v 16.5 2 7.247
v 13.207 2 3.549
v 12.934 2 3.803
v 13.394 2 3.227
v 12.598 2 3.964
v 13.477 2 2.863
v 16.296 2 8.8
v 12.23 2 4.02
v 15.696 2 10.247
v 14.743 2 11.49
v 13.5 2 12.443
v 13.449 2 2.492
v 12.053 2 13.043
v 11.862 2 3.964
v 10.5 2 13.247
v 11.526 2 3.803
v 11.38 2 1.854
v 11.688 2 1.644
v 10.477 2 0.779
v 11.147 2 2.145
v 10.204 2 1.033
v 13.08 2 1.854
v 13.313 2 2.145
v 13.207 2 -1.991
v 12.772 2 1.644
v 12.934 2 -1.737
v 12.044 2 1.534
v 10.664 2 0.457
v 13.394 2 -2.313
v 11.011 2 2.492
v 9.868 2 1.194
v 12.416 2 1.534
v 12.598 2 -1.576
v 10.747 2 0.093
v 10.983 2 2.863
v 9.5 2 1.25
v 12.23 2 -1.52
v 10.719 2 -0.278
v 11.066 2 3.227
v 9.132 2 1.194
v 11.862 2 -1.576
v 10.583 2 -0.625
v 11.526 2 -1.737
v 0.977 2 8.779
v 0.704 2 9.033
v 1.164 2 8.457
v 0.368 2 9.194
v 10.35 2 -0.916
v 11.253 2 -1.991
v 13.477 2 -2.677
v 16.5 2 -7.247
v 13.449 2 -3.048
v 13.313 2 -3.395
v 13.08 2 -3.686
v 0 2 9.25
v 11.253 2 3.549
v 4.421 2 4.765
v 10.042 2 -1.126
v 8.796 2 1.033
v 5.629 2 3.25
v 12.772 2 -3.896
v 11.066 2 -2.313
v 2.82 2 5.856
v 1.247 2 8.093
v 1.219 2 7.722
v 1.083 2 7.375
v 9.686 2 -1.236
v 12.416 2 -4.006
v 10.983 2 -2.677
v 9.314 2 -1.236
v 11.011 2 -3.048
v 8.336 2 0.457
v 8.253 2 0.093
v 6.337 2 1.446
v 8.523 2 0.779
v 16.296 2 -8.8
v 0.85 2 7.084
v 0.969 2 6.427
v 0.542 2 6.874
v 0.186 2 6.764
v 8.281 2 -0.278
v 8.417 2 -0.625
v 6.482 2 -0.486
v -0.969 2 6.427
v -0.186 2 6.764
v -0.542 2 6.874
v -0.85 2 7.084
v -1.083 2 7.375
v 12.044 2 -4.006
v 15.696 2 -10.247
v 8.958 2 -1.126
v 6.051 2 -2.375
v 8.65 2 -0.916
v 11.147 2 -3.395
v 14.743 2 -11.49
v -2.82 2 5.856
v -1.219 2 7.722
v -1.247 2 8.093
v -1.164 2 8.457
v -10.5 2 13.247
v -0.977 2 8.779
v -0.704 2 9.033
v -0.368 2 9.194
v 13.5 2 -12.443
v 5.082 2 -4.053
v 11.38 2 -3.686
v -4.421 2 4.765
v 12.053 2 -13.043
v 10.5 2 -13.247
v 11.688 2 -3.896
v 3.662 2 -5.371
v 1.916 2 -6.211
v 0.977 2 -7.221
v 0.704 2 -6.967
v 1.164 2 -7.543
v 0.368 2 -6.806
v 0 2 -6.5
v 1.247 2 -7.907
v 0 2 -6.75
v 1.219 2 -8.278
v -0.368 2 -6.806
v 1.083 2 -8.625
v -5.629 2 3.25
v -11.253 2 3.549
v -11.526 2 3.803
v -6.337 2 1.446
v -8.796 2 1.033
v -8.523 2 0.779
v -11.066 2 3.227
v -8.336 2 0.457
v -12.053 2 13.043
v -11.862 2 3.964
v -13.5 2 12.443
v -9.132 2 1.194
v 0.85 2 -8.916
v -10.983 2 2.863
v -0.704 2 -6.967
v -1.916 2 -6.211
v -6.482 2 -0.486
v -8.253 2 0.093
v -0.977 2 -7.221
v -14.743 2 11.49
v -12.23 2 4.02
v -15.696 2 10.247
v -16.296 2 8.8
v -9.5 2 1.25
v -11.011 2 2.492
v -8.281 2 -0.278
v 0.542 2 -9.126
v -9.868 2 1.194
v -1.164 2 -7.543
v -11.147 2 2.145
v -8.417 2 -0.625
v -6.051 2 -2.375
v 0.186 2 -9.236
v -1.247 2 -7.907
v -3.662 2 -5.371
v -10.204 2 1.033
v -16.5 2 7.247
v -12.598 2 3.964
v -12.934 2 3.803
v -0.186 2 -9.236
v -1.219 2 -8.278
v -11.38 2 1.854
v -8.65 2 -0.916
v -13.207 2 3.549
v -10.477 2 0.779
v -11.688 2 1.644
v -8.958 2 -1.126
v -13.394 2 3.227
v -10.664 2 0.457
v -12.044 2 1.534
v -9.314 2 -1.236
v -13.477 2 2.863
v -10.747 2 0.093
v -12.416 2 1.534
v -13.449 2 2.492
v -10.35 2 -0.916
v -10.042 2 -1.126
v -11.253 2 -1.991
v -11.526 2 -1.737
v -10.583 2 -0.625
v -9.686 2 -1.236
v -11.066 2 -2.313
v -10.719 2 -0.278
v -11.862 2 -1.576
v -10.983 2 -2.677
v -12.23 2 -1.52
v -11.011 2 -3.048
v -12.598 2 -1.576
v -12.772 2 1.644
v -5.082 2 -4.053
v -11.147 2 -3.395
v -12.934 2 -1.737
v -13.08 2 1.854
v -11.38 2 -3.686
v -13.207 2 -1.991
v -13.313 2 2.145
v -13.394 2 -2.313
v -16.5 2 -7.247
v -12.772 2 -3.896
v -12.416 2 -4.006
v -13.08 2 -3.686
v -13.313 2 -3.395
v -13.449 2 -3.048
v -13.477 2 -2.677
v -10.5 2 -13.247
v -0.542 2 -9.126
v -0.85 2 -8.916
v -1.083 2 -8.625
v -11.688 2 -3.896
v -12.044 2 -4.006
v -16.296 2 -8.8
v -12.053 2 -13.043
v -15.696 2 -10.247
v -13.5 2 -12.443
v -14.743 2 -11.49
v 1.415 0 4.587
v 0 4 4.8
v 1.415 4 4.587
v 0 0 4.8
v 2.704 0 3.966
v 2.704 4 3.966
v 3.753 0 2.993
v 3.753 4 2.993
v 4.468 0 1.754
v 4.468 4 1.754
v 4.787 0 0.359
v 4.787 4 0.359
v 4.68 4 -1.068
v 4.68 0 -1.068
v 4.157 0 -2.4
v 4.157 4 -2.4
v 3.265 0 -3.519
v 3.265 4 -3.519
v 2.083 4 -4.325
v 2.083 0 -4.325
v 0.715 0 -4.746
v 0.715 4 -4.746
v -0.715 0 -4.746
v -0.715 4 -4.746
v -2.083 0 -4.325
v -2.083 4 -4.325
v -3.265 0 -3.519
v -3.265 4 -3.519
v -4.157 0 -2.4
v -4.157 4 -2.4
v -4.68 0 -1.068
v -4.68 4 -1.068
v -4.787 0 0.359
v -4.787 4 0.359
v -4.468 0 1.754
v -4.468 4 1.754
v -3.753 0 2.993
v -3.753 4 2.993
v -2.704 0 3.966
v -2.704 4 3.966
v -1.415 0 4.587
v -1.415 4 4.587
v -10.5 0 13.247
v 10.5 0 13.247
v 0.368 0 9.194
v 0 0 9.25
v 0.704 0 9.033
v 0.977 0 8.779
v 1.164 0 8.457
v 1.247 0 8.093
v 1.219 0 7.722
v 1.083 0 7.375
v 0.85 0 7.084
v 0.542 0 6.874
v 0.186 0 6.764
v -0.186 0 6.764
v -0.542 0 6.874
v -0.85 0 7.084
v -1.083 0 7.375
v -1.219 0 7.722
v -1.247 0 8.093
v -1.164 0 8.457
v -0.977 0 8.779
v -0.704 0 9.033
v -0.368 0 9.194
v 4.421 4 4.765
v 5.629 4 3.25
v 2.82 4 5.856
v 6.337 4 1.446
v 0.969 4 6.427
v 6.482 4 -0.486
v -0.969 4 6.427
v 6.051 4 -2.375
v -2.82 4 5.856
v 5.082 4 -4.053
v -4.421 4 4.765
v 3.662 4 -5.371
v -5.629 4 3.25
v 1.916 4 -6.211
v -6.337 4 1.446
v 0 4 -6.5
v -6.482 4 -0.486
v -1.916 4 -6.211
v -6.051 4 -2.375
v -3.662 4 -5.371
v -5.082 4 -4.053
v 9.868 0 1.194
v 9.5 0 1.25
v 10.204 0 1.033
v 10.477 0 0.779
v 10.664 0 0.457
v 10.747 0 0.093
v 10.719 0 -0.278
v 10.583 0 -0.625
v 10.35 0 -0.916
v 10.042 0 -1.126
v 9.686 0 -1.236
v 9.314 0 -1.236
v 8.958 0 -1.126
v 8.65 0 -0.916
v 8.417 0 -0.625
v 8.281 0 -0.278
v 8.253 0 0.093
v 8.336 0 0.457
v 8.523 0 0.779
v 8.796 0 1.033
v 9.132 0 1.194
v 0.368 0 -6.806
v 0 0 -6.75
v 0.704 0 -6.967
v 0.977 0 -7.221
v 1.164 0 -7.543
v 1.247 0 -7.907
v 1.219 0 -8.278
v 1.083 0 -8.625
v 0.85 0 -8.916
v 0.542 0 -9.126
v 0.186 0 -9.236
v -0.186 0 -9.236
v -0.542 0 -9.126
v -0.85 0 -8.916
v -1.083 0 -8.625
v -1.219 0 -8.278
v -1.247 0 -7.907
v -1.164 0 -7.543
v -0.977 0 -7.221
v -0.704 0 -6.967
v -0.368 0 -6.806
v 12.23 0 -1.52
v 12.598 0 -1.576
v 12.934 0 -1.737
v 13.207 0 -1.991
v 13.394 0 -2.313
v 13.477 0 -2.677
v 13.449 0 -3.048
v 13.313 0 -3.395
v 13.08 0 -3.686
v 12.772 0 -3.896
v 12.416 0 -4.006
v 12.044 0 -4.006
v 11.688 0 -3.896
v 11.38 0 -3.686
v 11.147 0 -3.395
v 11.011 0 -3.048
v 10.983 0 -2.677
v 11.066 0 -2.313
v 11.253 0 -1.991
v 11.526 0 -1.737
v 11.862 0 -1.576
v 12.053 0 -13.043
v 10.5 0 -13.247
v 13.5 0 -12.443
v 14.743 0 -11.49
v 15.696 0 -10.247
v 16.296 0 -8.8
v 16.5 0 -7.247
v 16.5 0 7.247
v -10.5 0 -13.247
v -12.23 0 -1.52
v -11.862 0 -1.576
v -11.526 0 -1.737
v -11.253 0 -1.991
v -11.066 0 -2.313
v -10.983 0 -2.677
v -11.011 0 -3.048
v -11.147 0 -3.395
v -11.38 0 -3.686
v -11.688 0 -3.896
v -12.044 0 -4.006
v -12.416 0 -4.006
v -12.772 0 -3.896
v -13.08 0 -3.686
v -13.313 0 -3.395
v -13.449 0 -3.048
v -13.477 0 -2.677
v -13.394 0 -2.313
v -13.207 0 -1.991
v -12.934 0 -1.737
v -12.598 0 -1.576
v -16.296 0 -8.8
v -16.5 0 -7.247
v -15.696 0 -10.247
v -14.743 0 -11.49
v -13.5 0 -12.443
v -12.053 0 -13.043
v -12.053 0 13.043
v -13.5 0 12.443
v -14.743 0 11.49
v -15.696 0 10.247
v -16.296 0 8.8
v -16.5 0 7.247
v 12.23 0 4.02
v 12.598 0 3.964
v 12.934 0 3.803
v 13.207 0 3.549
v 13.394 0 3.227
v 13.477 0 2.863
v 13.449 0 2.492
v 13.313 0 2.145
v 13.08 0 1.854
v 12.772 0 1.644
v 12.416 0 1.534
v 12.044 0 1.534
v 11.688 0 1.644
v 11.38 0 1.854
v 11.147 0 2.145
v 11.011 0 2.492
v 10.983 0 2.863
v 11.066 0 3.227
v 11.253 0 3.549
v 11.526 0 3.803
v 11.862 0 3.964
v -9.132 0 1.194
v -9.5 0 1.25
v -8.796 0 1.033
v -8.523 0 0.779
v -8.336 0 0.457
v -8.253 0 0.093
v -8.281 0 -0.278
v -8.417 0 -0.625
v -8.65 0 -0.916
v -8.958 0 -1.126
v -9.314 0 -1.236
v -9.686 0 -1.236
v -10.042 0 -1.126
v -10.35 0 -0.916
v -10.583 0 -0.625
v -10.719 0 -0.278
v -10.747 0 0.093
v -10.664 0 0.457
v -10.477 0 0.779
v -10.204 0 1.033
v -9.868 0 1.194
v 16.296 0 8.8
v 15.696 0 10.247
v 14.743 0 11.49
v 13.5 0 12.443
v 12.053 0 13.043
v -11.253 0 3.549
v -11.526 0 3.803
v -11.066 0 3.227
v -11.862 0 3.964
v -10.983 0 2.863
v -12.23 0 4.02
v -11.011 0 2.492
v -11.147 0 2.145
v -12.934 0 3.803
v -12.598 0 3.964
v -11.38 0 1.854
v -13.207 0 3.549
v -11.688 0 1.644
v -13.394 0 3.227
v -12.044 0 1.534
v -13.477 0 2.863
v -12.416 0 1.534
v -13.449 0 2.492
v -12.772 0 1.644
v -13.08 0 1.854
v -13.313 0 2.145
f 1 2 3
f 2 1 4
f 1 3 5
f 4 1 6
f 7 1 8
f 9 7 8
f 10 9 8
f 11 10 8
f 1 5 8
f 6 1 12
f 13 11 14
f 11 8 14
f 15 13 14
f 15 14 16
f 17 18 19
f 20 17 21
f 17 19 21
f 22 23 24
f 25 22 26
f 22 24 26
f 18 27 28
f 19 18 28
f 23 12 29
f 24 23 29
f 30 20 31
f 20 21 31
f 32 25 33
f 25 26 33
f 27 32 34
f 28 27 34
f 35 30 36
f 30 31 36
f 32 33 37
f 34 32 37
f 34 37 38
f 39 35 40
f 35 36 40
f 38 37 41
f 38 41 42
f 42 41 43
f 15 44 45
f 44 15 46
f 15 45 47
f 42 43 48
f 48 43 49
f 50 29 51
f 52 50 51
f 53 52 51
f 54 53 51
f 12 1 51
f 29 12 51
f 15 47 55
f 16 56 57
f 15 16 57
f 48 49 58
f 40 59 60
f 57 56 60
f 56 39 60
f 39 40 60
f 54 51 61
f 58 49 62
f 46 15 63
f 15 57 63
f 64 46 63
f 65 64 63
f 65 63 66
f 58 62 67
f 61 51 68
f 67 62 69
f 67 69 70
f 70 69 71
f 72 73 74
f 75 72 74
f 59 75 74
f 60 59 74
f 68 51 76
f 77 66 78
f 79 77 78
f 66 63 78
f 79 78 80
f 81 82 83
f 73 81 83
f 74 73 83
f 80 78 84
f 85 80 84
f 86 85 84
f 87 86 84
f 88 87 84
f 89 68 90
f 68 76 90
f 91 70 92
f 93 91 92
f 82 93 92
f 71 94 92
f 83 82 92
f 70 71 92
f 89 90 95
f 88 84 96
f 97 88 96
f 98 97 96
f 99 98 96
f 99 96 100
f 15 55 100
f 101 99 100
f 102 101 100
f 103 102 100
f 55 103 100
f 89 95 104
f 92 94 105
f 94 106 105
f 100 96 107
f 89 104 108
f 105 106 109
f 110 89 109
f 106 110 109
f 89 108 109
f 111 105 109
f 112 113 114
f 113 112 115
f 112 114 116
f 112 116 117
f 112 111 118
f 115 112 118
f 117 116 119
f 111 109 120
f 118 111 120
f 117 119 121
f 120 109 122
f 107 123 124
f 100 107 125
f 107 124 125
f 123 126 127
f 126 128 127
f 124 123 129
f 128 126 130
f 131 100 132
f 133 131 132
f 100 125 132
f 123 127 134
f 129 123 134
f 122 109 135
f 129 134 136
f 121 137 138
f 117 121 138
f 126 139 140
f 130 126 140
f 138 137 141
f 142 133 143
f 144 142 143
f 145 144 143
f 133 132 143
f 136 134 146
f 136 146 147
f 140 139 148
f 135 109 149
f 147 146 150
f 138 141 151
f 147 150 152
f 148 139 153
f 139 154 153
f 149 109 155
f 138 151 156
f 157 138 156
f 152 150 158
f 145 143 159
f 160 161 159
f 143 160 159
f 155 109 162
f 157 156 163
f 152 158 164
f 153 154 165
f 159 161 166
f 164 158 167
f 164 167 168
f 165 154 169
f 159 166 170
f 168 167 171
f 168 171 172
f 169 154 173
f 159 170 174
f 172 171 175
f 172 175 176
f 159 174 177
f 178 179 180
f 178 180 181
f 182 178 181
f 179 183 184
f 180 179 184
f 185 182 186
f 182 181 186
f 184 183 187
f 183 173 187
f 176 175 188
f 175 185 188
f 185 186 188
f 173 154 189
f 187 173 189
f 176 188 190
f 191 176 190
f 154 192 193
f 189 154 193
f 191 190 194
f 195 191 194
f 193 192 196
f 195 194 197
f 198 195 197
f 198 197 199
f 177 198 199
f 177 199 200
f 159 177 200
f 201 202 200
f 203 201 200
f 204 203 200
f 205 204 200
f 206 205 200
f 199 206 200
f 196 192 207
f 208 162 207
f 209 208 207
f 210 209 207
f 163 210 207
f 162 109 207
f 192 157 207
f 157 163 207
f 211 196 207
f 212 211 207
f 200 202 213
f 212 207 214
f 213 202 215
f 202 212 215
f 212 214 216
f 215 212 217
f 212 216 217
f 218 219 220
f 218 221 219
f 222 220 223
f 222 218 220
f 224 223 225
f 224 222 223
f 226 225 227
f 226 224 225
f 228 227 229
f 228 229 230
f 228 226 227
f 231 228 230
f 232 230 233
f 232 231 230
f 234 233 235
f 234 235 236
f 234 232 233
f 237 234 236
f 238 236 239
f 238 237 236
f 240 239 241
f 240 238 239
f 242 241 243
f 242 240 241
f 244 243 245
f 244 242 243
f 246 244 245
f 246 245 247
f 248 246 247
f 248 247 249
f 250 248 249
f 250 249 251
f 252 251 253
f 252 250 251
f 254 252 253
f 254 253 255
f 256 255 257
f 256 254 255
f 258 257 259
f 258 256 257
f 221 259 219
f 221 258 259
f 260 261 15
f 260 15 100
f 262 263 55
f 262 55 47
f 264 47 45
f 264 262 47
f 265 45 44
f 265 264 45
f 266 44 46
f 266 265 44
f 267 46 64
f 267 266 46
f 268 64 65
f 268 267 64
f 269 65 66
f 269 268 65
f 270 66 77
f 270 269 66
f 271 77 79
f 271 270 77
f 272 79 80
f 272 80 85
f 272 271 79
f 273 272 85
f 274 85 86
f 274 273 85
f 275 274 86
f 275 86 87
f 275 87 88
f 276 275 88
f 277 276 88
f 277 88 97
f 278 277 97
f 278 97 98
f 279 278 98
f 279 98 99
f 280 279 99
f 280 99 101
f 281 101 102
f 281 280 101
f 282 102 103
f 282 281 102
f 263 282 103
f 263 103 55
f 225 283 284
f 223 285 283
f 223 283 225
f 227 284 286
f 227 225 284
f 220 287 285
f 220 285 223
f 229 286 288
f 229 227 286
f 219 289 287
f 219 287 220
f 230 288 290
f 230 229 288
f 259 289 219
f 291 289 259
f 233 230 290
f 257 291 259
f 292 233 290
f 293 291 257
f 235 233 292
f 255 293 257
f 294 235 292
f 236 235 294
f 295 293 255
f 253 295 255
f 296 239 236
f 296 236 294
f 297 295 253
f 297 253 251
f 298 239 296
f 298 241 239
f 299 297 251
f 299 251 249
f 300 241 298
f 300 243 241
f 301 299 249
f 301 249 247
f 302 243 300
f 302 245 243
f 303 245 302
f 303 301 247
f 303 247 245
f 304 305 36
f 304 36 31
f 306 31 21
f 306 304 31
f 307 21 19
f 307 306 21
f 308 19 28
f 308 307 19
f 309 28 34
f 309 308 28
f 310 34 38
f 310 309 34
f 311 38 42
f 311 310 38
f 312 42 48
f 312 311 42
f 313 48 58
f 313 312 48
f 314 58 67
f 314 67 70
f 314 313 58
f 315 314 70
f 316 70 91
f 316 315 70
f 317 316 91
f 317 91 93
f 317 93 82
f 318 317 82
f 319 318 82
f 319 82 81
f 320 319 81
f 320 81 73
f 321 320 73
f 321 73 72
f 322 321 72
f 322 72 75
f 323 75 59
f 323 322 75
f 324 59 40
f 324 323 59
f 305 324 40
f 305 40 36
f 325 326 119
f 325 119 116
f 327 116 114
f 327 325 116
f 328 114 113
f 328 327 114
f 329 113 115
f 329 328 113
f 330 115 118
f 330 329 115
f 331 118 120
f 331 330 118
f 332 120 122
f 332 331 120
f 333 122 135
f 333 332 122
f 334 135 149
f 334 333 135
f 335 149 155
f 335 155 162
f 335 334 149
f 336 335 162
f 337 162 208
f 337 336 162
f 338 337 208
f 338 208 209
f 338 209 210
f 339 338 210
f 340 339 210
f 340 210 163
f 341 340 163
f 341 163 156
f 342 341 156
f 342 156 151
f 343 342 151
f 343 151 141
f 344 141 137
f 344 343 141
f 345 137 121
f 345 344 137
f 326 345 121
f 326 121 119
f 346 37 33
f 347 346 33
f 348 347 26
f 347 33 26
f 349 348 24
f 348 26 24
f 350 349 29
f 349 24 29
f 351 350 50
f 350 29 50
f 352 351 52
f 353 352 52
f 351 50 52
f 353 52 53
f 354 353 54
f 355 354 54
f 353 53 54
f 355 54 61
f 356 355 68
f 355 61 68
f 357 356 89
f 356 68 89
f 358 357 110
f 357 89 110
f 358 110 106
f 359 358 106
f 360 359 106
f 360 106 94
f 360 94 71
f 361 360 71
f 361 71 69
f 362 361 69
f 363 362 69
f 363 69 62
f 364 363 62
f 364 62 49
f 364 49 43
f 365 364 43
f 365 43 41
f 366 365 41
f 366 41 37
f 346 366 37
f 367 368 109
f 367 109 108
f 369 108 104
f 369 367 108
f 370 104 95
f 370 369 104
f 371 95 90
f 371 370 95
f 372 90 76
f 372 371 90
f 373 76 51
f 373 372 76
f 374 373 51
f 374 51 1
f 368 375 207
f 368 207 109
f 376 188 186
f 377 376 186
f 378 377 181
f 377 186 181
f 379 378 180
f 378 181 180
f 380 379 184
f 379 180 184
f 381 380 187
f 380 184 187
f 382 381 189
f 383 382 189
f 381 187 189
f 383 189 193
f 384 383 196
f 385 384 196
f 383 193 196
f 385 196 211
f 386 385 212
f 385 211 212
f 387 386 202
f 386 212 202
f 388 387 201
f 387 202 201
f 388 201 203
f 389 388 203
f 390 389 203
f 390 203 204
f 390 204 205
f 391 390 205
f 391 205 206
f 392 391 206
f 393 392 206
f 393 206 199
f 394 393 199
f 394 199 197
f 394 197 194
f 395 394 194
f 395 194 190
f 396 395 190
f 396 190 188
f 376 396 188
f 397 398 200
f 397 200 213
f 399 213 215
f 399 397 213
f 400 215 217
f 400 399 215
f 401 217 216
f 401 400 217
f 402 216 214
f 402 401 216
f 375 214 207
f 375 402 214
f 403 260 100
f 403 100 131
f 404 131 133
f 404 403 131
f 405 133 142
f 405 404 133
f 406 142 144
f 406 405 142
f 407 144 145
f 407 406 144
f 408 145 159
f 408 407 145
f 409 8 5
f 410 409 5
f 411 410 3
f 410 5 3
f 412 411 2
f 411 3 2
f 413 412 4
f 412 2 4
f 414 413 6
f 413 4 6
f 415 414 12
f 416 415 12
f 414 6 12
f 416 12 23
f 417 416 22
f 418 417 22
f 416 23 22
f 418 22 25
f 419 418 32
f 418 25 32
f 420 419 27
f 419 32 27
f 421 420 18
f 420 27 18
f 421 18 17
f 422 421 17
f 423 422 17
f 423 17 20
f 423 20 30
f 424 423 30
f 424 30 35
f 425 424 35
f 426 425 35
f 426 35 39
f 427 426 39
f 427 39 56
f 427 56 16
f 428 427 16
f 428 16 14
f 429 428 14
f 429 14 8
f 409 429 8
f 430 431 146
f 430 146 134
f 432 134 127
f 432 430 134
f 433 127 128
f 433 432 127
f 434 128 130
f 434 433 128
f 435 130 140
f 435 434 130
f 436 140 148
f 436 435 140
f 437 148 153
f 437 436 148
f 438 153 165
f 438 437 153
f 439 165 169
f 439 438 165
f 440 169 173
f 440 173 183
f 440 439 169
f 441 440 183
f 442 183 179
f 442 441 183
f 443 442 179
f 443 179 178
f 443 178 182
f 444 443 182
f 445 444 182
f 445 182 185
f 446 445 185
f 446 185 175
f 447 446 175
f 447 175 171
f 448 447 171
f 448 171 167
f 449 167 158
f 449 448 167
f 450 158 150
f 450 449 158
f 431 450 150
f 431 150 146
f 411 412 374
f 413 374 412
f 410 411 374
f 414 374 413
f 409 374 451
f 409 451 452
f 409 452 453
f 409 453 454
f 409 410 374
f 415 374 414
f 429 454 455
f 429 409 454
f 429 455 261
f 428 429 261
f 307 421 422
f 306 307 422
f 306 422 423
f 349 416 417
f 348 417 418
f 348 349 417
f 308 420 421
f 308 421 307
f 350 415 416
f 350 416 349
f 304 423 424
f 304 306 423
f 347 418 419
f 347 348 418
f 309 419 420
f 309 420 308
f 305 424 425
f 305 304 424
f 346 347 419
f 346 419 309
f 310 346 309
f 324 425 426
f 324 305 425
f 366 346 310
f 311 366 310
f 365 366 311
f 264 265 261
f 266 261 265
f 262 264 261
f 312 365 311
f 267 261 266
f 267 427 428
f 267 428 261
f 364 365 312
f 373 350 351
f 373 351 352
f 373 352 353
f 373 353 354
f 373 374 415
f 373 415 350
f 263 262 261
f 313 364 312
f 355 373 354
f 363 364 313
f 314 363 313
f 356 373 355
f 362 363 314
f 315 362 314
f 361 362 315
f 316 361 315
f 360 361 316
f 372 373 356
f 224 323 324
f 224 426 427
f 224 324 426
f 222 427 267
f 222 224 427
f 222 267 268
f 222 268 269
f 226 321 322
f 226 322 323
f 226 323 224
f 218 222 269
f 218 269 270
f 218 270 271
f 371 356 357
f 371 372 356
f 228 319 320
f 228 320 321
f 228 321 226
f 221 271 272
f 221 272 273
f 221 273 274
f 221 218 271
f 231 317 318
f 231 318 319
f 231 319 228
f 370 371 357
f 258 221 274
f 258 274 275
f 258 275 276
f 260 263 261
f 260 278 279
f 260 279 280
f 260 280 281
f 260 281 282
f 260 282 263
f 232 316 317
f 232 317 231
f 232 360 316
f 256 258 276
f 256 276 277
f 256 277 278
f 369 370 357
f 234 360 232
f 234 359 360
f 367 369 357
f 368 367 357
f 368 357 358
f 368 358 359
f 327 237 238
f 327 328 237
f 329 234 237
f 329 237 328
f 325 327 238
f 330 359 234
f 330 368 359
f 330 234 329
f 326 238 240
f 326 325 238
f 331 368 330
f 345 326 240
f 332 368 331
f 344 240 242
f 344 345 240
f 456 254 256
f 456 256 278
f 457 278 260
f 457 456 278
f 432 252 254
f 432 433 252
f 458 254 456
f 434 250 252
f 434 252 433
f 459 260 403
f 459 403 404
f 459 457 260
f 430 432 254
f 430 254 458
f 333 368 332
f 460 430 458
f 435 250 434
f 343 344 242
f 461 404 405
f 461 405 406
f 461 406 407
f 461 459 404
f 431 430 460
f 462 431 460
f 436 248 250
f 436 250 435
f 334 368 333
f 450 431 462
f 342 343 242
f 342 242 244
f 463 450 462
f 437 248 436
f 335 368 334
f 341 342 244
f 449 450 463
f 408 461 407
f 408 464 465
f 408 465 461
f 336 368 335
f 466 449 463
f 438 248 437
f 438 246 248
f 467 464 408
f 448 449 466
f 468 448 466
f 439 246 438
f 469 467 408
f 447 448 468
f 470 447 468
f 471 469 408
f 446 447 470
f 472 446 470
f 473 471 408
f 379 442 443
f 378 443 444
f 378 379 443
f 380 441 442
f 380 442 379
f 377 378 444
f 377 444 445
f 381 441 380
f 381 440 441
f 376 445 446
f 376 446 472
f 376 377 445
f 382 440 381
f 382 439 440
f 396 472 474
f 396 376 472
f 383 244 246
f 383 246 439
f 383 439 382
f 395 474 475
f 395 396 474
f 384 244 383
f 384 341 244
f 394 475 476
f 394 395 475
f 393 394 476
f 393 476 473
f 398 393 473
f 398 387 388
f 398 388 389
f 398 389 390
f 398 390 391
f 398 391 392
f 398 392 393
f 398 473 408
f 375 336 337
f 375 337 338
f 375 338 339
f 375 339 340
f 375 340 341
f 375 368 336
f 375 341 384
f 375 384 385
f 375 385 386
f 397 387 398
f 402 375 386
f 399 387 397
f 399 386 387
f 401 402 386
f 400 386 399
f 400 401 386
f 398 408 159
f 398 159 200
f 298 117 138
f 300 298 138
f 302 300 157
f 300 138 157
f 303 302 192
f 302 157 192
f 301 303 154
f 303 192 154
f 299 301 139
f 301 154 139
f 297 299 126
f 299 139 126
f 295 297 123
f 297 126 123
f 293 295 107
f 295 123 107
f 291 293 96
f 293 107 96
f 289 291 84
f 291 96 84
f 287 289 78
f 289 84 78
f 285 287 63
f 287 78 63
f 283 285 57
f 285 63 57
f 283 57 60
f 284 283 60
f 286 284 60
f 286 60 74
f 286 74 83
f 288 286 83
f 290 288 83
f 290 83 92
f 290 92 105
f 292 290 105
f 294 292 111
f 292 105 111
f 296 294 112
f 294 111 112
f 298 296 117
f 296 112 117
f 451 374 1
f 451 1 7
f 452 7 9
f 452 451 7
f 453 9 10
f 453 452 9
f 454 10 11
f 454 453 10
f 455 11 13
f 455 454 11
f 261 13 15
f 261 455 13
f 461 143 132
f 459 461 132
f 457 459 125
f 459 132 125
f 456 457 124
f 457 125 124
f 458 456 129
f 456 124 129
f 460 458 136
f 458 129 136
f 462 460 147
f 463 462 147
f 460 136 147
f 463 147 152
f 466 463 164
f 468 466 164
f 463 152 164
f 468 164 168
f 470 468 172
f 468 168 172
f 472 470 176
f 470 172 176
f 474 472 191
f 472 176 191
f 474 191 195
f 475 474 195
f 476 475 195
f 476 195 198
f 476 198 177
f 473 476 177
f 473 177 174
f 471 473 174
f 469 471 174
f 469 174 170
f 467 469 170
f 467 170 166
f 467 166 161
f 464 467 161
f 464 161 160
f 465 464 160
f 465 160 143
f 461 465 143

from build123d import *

# Parameters (mm, degrees)
SKETCH_1_R          = 1.25
SKETCH_1_R_2        = 4.8
EXTRUDE_1_DEPTH     = 2
SKETCH_3_R          = 6.5
SKETCH_3_R_2        = 4.8
EXTRUDE_2_DEPTH     = 2
SKETCH_5_R          = 1.25
CUT_EXTRUDE_1_DEPTH = 10


with BuildPart() as part:
    # 草图1 → 凸台-拉伸1 (new body)
    with BuildSketch(Plane(origin=(0, 0, 0), x_dir=(1, 0, 0), z_dir=(0, 1, 0))):
        with BuildLine():
            Line((10.5, -13.247031622), (-10.5, -13.247031622))
            ThreePointArc((-10.5, -13.247031622), (-14.742640687, -11.489672309), (-16.5, -7.247031622))
            Line((-16.5, -7.247031622), (-16.5, 7.247031622))
            ThreePointArc((-16.5, 7.247031622), (-14.742640687, 11.489672309), (-10.5, 13.247031622))
            Line((-10.5, 13.247031622), (10.5, 13.247031622))
            ThreePointArc((10.5, 13.247031622), (14.742640687, 11.489672309), (16.5, 7.247031622))
            Line((16.5, 7.247031622), (16.5, -7.247031622))
            ThreePointArc((16.5, -7.247031622), (14.742640687, -11.489672309), (10.5, -13.247031622))
        make_face()
        with Locations(Location((0, 8, 0), (0, 0, 270))):
            Circle(SKETCH_1_R, mode=Mode.SUBTRACT)
        with Locations(Location((0, -8, 0), (0, 0, 270))):
            Circle(SKETCH_1_R, mode=Mode.SUBTRACT)
        with Locations(Location((-9.5, 0, 0), (0, 0, 270))):
            Circle(SKETCH_1_R, mode=Mode.SUBTRACT)
        with Locations(Location((9.5, 0, 0), (0, 0, 270))):
            Circle(SKETCH_1_R, mode=Mode.SUBTRACT)
        with Locations(Location((0, 0, 0), (0, 0, 270))):
            Circle(SKETCH_1_R_2, mode=Mode.SUBTRACT)
    extrude(amount=EXTRUDE_1_DEPTH)

    # 草图3 → 凸台-拉伸2 (add)
    with BuildSketch(Plane(origin=(0, 2, 0), x_dir=(1, 0, 0), z_dir=(0, 1, 0))):
        with Locations(Location((0, 0, 0), (0, 0, 90))):
            Circle(SKETCH_3_R)
        with Locations(Location((0, 0, 0), (0, 0, 270))):
            Circle(SKETCH_3_R_2, mode=Mode.SUBTRACT)
    extrude(amount=EXTRUDE_2_DEPTH)

    # 草图5 → 切除-拉伸1 (cut)
    with BuildSketch(Plane(origin=(0, 2, 0), x_dir=(1, 0, 0), z_dir=(0, 1, 0))):
        with Locations(Location((-12.23, 2.77, 0), (0, 0, 270))):
            Circle(SKETCH_5_R)
        with Locations(Location((-12.23, -2.77, 0), (0, 0, 270))):
            Circle(SKETCH_5_R)
        with Locations(Location((12.23, -2.77, 0), (0, 0, 270))):
            Circle(SKETCH_5_R)
        with Locations(Location((12.23, 2.77, 0), (0, 0, 270))):
            Circle(SKETCH_5_R)
    extrude(amount=-CUT_EXTRUDE_1_DEPTH, mode=Mode.SUBTRACT)


solid = part.part
